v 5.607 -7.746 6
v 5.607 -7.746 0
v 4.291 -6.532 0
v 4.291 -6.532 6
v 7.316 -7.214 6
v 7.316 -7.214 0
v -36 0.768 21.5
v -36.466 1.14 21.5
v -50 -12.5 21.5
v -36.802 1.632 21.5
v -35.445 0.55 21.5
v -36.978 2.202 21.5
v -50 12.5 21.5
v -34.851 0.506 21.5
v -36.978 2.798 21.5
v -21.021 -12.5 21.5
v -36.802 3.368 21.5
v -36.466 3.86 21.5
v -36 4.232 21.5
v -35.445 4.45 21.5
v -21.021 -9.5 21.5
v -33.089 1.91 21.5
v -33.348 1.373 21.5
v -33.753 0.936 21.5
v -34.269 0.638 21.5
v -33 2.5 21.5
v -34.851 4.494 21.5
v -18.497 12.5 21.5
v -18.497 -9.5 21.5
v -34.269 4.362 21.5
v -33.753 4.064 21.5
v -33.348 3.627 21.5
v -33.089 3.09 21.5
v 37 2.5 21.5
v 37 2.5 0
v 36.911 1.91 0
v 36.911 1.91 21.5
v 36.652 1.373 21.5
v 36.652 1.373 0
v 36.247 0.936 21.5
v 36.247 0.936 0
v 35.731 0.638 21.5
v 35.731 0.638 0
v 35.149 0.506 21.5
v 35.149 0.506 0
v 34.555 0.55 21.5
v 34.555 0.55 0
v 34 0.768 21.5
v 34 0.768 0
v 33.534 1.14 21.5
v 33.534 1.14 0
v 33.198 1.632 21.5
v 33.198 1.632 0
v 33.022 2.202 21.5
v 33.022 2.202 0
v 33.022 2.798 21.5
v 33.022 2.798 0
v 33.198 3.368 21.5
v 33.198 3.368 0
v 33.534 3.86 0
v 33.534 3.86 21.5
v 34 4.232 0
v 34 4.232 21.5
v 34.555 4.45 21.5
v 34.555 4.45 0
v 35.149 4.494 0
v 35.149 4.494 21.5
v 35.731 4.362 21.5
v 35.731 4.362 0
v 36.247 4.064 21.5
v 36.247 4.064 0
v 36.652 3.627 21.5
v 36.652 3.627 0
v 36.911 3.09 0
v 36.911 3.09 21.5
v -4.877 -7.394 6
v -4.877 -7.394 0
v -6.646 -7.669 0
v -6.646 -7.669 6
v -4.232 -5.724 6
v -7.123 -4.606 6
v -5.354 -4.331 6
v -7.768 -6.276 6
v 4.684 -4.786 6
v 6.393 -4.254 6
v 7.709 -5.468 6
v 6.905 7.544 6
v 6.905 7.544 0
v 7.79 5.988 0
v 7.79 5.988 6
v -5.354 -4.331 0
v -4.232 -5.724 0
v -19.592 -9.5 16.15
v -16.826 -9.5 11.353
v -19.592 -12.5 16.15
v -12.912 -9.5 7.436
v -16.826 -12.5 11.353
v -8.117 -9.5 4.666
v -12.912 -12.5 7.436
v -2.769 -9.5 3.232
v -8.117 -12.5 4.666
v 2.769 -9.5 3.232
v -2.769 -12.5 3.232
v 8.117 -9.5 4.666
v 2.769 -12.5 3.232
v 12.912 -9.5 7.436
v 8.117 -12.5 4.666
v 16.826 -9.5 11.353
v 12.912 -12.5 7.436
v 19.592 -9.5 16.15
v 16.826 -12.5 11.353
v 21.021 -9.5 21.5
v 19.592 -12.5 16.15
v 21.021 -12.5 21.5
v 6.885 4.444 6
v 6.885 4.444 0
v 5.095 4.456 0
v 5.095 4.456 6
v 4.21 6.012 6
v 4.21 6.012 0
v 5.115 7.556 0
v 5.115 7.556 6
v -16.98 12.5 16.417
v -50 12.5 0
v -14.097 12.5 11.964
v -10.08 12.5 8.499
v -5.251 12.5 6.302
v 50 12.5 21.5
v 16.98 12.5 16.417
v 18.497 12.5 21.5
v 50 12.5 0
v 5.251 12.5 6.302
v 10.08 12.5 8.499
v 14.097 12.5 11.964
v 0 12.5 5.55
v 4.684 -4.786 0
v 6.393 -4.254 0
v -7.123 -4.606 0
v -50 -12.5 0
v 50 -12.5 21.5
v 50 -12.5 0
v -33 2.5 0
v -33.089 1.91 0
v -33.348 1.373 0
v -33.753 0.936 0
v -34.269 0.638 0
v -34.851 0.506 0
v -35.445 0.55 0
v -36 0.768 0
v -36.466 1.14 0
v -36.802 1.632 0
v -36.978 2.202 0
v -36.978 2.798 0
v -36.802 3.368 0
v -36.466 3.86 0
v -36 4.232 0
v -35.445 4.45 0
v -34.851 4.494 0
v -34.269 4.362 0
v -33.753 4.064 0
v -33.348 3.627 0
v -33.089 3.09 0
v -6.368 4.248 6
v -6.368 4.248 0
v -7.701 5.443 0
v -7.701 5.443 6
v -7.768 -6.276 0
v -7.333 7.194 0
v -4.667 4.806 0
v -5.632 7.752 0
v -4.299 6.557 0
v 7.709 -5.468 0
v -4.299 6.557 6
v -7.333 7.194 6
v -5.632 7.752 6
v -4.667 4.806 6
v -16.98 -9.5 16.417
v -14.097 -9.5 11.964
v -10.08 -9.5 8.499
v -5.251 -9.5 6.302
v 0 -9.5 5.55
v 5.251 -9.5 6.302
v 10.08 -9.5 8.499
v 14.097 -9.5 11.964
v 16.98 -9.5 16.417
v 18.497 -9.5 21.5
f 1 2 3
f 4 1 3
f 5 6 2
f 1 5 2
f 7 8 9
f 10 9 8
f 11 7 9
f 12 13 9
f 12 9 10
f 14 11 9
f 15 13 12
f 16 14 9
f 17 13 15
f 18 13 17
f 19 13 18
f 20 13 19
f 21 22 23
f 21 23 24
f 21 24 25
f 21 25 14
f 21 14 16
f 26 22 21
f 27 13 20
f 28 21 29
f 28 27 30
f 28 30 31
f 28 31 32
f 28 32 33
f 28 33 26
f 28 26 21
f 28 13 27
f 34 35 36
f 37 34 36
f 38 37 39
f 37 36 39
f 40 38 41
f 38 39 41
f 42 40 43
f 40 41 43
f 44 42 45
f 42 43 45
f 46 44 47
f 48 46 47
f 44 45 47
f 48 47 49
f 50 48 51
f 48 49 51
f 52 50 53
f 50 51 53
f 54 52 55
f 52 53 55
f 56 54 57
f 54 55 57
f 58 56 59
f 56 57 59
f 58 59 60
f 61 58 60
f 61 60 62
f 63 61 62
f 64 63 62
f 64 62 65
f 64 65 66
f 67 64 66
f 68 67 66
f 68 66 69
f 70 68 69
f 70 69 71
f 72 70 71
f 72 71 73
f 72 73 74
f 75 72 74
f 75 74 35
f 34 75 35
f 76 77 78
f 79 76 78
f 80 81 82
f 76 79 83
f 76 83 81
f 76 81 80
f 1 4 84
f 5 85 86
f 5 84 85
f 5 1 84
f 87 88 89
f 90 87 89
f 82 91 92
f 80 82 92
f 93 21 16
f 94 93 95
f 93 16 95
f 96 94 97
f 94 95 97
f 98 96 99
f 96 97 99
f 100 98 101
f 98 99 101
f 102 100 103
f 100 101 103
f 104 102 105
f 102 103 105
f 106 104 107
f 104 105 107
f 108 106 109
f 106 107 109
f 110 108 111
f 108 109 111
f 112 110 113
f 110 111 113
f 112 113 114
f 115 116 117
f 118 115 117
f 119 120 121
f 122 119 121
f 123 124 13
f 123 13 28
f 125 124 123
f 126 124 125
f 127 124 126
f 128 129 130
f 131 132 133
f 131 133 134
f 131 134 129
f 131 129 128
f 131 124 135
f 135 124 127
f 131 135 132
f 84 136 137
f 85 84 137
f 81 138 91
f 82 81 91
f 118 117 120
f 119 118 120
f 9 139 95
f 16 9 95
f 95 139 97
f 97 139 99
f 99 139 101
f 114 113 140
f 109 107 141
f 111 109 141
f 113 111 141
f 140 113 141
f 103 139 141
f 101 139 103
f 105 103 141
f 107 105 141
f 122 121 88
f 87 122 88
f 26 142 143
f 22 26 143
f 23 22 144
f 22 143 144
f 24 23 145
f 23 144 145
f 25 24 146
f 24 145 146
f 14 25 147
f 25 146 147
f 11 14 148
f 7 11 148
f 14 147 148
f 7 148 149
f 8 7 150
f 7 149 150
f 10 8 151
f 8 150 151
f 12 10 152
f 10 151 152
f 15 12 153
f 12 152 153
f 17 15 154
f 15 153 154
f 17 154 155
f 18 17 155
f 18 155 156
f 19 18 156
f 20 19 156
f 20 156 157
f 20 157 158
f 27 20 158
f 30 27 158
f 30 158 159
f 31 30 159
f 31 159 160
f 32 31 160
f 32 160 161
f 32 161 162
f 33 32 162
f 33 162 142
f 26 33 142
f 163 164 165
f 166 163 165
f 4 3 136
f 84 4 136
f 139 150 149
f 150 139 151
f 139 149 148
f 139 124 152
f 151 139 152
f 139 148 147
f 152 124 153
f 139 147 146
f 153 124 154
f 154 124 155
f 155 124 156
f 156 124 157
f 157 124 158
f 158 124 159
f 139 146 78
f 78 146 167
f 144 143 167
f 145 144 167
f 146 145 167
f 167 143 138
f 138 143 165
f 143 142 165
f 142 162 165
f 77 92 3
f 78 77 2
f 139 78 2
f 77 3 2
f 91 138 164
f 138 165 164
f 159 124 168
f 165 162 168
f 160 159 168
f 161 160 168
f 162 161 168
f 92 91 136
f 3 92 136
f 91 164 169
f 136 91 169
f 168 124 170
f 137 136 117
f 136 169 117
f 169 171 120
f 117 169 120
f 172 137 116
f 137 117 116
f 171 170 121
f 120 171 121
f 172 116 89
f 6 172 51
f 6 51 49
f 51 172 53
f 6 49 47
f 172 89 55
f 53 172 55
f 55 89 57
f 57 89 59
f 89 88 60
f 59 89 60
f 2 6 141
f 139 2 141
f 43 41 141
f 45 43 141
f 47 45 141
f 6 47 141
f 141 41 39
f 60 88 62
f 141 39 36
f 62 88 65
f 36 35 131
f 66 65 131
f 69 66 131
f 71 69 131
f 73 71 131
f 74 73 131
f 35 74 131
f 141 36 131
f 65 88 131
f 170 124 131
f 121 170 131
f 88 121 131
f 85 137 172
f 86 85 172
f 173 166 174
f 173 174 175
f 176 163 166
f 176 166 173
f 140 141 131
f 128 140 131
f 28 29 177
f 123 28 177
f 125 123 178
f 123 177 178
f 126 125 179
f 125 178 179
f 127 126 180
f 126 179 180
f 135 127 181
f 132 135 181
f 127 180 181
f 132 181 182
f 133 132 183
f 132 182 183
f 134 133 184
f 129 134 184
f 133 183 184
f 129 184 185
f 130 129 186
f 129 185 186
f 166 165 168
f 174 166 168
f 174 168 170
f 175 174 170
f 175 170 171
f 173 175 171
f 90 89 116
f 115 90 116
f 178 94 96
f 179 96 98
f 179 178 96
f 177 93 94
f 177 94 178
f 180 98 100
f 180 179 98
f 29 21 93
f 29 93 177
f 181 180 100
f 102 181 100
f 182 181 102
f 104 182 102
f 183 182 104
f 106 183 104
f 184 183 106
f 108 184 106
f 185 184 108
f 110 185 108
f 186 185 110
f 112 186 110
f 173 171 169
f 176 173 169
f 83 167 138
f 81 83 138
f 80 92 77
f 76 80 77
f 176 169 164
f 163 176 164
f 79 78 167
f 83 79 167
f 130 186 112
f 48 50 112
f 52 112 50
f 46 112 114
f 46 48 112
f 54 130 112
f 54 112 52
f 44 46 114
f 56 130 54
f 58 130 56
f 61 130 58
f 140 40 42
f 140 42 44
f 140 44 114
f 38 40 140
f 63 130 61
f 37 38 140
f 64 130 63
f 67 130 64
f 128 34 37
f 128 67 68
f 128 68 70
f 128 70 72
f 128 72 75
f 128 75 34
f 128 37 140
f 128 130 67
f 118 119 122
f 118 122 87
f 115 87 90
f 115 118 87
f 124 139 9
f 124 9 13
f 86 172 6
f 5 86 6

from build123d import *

# Parameters (mm, degrees)
SKETCH_W        = 100
SKETCH_H        = 25
PAD_DEPTH       = 21.5
SKETCH001_R     = 18.7
POCKET_DEPTH    = 25.001
SKETCH002_R     = 21.2
POCKET001_DEPTH = 3
SKETCH003_R     = 2
POCKET002_DEPTH = 21.501
POCKET003_DEPTH = 6


with BuildPart() as part:
    # Sketch → Pad (new body)
    with BuildSketch(Plane.XY):
        Rectangle(SKETCH_W, SKETCH_H)
    extrude(amount=PAD_DEPTH)

    # Sketch001 → Pocket (cut, through all)
    with BuildSketch(Plane.XZ.offset(12.5)):
        with Locations((0, 24.25)):
            Circle(SKETCH001_R)
    extrude(amount=-POCKET_DEPTH, mode=Mode.SUBTRACT)

    # Sketch002 → Pocket001 (cut)
    with BuildSketch(Plane.XZ.offset(12.5)):
        with Locations((0, 24.25)):
            Circle(SKETCH002_R)
    extrude(amount=-POCKET001_DEPTH, mode=Mode.SUBTRACT)

    # Sketch003 → Pocket002 (cut, through all)
    with BuildSketch(Plane(origin=(0, 0, 0), x_dir=(1, 0, 0), z_dir=(0, 0, -1))):
        with Locations((-35, -2.5)):
            Circle(SKETCH003_R)
        with Locations((35, -2.5)):
            Circle(SKETCH003_R)
    extrude(amount=-POCKET002_DEPTH, mode=Mode.SUBTRACT)

    # Sketch004 → Pocket003 (cut)
    with BuildSketch(Plane(origin=(0, 0, 0), x_dir=(1, 0, 0), z_dir=(0, 0, -1))):
        Polygon((-4.231557, 5.724423), (-4.877122, 7.393728), (-6.645565, 7.669305), (-7.768443, 6.275577), (-7.122878, 4.606272), (-5.354435, 4.330695), align=None)
        Polygon((6.393216, 4.253943), (7.708738, 5.467507), (7.315521, 7.213564), (5.606784, 7.746057), (4.291262, 6.532493), (4.684479, 4.786436), align=None)
        Polygon((-5.632013, -7.751548), (-4.299122, -6.557088), (-4.667109, -4.80554), (-6.367987, -4.248452), (-7.700878, -5.442912), (-7.332891, -7.19446), align=None)
        Polygon((6.905144, -7.544036), (7.789747, -5.98814), (6.884602, -4.444104), (5.094856, -4.455964), (4.210253, -6.01186), (5.115398, -7.555896), align=None)
    extrude(amount=-POCKET003_DEPTH, mode=Mode.SUBTRACT)


solid = part.part
